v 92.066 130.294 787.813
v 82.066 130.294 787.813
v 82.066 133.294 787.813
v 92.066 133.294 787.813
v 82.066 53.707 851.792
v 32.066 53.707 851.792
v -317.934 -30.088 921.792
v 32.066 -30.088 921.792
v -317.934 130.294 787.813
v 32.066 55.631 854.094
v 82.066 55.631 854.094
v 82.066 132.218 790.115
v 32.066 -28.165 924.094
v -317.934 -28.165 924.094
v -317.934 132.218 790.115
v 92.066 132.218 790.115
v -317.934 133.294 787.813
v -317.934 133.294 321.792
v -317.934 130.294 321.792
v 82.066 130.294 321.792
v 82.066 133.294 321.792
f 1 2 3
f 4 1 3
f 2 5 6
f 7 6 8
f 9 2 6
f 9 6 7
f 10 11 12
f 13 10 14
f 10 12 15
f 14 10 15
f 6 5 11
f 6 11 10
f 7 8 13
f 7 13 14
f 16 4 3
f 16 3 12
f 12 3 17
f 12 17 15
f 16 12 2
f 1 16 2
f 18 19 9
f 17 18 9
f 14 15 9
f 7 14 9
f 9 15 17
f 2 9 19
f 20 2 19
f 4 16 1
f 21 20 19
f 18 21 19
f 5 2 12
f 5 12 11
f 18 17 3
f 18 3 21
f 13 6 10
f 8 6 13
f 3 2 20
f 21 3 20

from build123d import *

# Parameters (mm, degrees)
BOSS_EXTRUDE1_DEPTH = 3
BOSS_EXTRUDE3_DEPTH = 3
BOSS_EXTRUDE4_START = -10
BOSS_EXTRUDE4_DEPTH = 410


with BuildPart() as part:
    # 3DSketch1 → Boss-Extrude1 (new body)
    with BuildSketch(Plane(origin=(-317.933582459, 130.294447415, 321.791546701), x_dir=(0.6513102781690263, 0, 0.7588115191214388), z_dir=(0, -1, 0))):
        Polygon((0, 0), (353.62249966, 303.524607649), (614.146610928, 0), (260.524111268, -303.524607649), align=None)
    extrude(amount=-BOSS_EXTRUDE1_DEPTH)



with BuildPart() as body_2:
    # Sketch2 → Boss-Extrude3 (new body)
    with BuildSketch(Plane(origin=(0, 441.171604384, 528.116012859), x_dir=(1, 0, 0), z_dir=(0, 0.6411058174679163, 0.7674524941706782))):
        Polygon((-317.933582459, -614.057029458), (-317.933582459, -405.07674329), (82.066417541, -405.07674329), (82.066417541, -504.870685967), (32.066417541, -504.870685967), (32.066417541, -614.057029458), align=None)
    extrude(amount=BOSS_EXTRUDE3_DEPTH)


with BuildPart() as part_1:
    add(part.part)

    add(body_2.part)  # Boss-Extrude4 merges body 2
    # Sketch3 → Boss-Extrude4 (add)
    with BuildSketch(Plane.ZY.offset(327.933582459).offset(BOSS_EXTRUDE4_START)):
        Polygon((787.813069503, 130.294447415), (787.813069503, 133.294447415), (790.115426985, 132.217764868), align=None)
    extrude(amount=-BOSS_EXTRUDE4_DEPTH)


solid = part_1.part
